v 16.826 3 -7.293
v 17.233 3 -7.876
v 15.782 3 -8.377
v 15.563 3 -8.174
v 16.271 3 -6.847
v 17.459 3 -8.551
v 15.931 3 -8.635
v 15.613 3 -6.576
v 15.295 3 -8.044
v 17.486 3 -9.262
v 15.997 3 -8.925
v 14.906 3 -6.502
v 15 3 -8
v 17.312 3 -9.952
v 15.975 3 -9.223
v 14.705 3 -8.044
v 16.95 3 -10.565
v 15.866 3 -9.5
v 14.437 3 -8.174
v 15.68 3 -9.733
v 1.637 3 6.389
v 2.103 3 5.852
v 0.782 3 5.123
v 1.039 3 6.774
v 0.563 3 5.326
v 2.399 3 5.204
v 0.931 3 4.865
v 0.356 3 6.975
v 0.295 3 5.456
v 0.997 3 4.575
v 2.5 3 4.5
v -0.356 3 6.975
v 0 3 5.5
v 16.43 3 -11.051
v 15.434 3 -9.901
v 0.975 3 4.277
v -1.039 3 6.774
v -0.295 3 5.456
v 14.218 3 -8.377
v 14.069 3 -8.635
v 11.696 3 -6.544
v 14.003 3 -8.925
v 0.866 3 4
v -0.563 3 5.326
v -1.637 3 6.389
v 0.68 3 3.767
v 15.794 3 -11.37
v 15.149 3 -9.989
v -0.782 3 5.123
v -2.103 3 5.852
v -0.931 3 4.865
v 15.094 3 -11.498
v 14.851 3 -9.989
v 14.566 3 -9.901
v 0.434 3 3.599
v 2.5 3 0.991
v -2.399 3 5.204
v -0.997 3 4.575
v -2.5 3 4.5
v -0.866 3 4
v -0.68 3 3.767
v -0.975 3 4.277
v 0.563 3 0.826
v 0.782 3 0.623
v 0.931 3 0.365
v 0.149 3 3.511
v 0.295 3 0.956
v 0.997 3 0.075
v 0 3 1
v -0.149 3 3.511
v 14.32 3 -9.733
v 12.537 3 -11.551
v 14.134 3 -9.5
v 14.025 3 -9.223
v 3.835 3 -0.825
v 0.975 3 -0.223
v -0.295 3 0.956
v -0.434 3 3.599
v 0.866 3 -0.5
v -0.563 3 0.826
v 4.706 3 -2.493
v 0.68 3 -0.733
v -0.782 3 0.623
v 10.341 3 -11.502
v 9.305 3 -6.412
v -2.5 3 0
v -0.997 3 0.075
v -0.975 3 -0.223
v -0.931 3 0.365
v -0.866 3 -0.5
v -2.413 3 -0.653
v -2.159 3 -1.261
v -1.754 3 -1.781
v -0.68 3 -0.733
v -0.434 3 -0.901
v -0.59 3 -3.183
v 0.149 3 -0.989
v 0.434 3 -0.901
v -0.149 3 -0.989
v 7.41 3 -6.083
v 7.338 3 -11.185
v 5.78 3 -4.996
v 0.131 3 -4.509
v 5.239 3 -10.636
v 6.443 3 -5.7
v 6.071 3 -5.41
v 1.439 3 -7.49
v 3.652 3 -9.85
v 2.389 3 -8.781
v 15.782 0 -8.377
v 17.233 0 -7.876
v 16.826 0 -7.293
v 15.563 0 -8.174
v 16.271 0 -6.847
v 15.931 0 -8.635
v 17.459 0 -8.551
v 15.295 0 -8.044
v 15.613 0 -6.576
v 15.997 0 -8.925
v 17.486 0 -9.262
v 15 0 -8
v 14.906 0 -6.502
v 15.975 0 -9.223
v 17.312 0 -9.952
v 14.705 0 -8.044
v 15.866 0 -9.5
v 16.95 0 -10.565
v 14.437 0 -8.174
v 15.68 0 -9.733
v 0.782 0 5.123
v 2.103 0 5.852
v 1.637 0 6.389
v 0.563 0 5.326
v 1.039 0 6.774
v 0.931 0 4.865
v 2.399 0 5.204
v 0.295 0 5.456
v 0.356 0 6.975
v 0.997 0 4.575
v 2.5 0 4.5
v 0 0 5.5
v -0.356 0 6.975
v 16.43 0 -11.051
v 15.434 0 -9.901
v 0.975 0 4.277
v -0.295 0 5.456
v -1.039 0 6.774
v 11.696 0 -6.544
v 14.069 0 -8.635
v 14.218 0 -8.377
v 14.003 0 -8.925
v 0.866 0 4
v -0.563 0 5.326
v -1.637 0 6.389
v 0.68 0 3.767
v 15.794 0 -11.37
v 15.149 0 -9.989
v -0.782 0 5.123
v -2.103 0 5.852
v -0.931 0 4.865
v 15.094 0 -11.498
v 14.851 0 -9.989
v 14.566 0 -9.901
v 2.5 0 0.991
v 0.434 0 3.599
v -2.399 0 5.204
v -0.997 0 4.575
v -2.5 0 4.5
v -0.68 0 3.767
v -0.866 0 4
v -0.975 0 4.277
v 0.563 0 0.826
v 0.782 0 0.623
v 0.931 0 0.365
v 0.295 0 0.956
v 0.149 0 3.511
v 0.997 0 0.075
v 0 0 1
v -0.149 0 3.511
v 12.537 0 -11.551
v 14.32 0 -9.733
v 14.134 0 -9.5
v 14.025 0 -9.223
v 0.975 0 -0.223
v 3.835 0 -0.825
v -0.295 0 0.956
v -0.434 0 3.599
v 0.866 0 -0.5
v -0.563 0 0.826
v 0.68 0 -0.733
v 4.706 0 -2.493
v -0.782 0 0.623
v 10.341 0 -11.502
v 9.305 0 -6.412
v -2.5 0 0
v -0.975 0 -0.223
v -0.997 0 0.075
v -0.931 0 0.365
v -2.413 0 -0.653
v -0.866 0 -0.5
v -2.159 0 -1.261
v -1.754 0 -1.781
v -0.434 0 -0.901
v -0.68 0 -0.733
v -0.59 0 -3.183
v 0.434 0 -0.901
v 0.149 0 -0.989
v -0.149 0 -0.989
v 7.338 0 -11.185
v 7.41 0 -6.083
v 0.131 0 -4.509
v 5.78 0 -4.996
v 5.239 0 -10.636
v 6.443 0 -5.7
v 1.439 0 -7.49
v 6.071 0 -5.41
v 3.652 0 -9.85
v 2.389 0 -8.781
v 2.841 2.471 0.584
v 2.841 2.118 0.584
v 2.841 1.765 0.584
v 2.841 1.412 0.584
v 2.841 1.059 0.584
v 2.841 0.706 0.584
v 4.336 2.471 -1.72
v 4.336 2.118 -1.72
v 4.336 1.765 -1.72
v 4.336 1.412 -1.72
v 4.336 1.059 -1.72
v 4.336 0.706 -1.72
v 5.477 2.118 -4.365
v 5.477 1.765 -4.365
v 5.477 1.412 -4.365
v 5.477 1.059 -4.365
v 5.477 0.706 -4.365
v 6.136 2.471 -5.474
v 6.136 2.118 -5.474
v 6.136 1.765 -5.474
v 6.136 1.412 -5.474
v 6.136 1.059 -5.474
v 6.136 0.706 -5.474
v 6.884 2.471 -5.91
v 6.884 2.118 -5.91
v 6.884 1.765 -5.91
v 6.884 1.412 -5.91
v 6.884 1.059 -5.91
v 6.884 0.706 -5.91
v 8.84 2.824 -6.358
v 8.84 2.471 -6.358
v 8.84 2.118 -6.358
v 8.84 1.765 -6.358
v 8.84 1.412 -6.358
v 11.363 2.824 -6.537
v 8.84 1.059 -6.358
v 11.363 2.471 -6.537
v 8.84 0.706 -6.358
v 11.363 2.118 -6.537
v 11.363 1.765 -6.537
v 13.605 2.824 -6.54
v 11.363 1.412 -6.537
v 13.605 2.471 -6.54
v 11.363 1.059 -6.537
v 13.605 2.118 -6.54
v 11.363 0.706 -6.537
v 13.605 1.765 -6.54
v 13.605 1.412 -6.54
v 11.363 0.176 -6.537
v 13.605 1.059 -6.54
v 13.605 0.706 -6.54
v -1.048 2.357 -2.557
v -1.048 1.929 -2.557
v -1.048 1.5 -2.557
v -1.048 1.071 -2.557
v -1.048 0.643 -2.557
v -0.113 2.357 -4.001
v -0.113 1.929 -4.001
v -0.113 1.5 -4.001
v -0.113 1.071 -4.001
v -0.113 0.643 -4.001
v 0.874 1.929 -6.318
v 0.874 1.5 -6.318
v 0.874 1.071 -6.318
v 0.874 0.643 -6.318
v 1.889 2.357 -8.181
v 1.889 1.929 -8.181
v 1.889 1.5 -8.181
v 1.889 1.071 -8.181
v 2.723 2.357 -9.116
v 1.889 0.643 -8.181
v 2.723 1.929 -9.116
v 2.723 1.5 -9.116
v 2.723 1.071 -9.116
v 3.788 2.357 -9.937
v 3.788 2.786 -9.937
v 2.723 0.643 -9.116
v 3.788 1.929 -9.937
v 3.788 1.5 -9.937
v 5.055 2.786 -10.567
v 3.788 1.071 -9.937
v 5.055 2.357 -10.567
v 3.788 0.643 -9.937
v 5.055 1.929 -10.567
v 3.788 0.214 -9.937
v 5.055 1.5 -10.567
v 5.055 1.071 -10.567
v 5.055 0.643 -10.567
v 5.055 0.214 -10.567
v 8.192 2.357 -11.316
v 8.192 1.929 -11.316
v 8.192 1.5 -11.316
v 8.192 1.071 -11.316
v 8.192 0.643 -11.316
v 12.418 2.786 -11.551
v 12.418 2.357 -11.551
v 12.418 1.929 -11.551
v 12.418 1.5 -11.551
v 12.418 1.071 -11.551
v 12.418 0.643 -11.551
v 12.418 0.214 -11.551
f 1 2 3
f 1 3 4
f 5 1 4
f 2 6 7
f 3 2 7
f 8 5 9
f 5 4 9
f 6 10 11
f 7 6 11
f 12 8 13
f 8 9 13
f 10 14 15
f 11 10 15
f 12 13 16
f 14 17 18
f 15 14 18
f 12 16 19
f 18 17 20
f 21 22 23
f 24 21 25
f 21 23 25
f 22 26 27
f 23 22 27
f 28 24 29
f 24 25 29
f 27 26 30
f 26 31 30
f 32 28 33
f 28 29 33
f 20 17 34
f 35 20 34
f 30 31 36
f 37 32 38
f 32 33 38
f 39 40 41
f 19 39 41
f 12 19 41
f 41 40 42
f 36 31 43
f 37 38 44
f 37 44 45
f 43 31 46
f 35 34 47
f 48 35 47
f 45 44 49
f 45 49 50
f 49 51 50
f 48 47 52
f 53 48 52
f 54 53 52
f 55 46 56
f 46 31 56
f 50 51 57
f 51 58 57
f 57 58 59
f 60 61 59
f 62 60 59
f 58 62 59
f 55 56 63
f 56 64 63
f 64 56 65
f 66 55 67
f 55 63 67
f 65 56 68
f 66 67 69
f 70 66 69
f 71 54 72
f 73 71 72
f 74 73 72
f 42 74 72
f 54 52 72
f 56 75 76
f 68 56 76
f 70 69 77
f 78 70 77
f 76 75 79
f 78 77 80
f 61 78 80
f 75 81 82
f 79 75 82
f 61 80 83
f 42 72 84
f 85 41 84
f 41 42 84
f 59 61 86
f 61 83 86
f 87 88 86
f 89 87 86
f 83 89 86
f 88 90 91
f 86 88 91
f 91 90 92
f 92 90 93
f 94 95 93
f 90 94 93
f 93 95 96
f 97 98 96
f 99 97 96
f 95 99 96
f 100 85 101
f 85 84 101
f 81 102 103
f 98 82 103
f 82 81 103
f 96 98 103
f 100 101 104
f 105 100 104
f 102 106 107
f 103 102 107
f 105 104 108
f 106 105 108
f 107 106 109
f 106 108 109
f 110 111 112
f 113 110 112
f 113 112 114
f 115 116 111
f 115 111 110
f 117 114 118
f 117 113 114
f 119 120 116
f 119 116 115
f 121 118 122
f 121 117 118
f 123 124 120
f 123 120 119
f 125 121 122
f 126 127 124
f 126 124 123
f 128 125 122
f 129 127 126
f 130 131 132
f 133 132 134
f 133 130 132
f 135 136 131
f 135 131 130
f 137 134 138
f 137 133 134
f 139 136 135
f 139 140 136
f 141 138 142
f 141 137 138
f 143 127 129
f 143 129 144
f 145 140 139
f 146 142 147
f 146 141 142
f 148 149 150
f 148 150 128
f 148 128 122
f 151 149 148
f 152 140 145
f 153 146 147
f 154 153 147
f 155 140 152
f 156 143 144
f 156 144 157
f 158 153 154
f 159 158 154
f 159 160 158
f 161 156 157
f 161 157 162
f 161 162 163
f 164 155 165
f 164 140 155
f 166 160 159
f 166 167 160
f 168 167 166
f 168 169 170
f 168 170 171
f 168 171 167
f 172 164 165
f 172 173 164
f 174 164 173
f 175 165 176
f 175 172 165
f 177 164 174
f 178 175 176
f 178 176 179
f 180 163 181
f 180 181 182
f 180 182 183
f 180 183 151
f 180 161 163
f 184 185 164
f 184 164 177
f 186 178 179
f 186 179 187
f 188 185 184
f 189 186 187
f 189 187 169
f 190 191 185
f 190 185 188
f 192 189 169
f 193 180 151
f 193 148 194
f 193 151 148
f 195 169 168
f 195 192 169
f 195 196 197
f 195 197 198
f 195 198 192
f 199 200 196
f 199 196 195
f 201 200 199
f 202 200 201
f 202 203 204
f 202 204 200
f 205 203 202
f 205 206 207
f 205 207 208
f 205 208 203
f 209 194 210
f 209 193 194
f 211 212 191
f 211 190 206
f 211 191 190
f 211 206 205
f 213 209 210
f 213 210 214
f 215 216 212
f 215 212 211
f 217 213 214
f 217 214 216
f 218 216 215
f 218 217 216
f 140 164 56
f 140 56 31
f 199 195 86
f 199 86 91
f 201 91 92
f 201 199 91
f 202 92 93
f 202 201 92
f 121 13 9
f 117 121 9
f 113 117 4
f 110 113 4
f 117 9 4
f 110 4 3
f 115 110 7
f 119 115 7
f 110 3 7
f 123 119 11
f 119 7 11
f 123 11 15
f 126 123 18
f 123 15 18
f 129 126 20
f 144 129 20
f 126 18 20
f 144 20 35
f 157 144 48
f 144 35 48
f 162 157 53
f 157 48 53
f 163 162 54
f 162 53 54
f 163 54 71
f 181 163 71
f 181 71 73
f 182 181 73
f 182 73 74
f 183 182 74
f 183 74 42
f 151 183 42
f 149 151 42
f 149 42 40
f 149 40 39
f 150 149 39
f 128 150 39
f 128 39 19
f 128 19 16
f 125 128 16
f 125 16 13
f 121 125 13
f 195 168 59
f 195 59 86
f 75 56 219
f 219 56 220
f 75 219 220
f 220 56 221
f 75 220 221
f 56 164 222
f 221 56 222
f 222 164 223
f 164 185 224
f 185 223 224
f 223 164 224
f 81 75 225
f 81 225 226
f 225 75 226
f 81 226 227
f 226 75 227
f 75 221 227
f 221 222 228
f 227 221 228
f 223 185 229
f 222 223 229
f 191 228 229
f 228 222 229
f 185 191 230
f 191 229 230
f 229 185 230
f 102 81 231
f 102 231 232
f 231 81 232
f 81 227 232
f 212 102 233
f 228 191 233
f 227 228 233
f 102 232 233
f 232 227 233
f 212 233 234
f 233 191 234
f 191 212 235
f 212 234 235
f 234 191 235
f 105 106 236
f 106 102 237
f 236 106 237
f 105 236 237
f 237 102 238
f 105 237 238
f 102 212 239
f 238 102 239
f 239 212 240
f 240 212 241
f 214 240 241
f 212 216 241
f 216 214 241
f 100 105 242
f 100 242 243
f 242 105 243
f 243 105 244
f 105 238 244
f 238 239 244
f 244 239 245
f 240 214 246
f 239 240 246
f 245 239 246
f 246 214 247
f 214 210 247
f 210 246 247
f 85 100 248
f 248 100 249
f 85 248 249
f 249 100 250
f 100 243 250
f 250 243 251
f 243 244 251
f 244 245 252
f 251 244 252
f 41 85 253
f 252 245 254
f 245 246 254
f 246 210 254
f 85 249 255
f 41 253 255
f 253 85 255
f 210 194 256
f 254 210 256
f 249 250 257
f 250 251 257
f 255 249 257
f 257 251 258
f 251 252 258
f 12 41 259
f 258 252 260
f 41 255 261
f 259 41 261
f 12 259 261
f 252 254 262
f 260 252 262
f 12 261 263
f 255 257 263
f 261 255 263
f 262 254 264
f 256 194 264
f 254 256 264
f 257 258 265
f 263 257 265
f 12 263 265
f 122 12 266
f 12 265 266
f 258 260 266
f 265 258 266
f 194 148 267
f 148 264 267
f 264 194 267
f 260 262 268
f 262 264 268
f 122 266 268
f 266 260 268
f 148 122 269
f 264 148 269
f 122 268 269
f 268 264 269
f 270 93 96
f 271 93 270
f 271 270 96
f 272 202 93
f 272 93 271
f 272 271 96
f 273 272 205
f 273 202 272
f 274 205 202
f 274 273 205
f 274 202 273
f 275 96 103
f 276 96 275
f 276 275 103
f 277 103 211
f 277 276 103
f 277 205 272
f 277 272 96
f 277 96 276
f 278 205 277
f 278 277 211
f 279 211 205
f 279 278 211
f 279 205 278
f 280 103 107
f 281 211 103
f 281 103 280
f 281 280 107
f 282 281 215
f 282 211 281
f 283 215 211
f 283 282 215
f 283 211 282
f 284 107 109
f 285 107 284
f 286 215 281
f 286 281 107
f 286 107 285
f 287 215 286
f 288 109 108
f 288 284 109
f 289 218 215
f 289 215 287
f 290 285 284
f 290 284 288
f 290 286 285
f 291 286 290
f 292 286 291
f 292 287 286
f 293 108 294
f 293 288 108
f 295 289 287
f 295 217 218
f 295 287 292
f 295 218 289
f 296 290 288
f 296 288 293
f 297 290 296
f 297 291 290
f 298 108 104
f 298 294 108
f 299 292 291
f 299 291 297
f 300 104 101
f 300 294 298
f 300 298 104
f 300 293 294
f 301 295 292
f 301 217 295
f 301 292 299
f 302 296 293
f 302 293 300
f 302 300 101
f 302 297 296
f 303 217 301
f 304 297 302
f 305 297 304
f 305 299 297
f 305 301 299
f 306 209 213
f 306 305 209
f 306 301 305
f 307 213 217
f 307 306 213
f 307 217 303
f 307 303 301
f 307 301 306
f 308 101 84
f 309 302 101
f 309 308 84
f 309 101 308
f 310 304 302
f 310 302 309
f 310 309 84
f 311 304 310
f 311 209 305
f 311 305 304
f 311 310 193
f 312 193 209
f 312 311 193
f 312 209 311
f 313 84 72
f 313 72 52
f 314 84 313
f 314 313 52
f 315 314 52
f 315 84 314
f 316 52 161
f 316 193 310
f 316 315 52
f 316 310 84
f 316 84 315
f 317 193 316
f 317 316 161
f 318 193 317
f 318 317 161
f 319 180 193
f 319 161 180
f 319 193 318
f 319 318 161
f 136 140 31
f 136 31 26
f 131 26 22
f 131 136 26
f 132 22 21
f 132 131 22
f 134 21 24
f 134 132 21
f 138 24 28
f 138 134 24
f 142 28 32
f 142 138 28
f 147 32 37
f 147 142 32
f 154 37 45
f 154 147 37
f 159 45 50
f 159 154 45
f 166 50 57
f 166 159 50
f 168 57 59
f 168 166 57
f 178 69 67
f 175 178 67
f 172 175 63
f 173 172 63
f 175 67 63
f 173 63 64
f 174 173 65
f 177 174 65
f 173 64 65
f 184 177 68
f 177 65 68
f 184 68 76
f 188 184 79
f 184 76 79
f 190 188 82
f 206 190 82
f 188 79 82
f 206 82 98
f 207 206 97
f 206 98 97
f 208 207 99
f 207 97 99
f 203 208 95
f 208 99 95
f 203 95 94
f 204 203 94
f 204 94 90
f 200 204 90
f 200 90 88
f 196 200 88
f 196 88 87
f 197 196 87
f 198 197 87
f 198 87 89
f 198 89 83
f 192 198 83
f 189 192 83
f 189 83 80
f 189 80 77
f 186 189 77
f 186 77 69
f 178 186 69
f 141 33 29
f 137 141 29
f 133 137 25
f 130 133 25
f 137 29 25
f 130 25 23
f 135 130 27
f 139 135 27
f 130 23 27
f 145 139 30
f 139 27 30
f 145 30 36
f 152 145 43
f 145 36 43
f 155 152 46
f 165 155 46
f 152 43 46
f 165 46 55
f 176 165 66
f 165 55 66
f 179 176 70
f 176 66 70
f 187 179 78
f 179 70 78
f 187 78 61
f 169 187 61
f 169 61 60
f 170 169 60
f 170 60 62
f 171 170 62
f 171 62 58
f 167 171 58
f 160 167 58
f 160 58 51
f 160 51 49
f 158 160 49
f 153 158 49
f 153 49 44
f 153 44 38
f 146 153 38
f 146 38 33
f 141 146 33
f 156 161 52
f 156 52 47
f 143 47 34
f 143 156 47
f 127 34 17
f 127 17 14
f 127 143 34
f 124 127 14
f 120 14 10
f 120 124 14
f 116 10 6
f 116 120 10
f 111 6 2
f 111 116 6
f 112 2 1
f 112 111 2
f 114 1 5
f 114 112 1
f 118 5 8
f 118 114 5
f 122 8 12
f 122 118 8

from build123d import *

# Parameters (mm, degrees)
BOSS_EXTRUDE1_DEPTH = 3
SKETCH2_R           = 1
CUT_EXTRUDE1_DEPTH  = 22.181959729


with BuildPart() as part:
    # Sketch1 → Boss-Extrude1 (new body)
    with BuildSketch(Plane(origin=(0, 0, 0), x_dir=(1, 0, 0), z_dir=(0, 1, 0))):
        with BuildLine():
            Line((2.5, 0), (2.5, -4.5))
            ThreePointArc((2.5, -4.5), (0, -7), (-2.5, -4.5))
            Line((-2.5, -4.5), (-2.5, 0))
            ThreePointArc((-2.5, 0), (0, 2.5), (2.5, 0))
        make_face()
        with BuildLine():
            ThreePointArc((1.75437082, -1.781062331), (-1.781062331, -1.75437082), (-1.75437082, 1.781062331))
            add(Edge.make_bspline(
                [(-1.75437082, 1.781062331), (-1.624344078, 1.909140455), (-1.363618783, 2.180920031), (-0.934031434, 2.684894066), (-0.500467654, 3.293174505), (-0.101558497, 3.999057838), (0.34080487, 4.957895832), (0.821917137, 6.255571477), (1.714343148, 8.188128347), (3.655881762, 10.080915103), (5.933377524, 10.940861788), (8.146541971, 11.336521676), (10.080084472, 11.509987641), (11.978583924, 11.559465158), (13.677207867, 11.543719259), (14.630887101, 11.515746346), (15.094478117, 11.498214139)],
                knots=[0, 0, 0, 0, 0.03125, 0.0625, 0.125, 0.1875, 0.25, 0.375, 0.5, 0.625, 0.75, 0.8125, 0.875, 0.9375, 0.96875, 1, 1, 1, 1], degree=3))
            ThreePointArc((15.094478117, 11.498214139), (17.498214139, 8.905521883), (14.905521883, 6.501785861))
            add(Edge.make_bspline(
                [(1.75437082, -1.781062331), (1.951496972, -1.586890368), (2.342143686, -1.179754933), (3.020330121, -0.385545775), (3.725845298, 0.603727778), (4.363656227, 1.735460048), (4.994886909, 3.116947346), (5.504379808, 4.503589215), (5.878706331, 5.199246763), (6.125781999, 5.475918673), (6.372815317, 5.672288553), (6.830218188, 5.908335694), (7.611720621, 6.156671842), (8.771844258, 6.369671634), (10.080276197, 6.489545456), (11.343932269, 6.540793236), (12.408742942, 6.555070021), (13.575038588, 6.544467964), (14.472115696, 6.51817653), (14.905521883, 6.501785861)],
                knots=[0, 0, 0, 0, 0.03125, 0.0625, 0.125, 0.1875, 0.25, 0.375, 0.5, 0.5625, 0.625, 0.6875, 0.75, 0.8125, 0.875, 0.90625, 0.9375, 0.96875, 1, 1, 1, 1], degree=3))
        make_face()
    extrude(amount=BOSS_EXTRUDE1_DEPTH)

    # Sketch2 → Cut-Extrude1 (cut, through all)
    with BuildSketch(Plane(origin=(0, 3, 0), x_dir=(1, 0, 0), z_dir=(0, 1, 0))):
        with Locations(Location((0, 0, 0), (0, 0, 270))):
            Circle(SKETCH2_R)
        with Locations(Location((0, -4.5, 0), (0, 0, 270))):
            Circle(SKETCH2_R)
        with Locations(Location((15, 9, 0), (0, 0, 270))):
            Circle(SKETCH2_R)
    extrude(amount=-CUT_EXTRUDE1_DEPTH, mode=Mode.SUBTRACT)


solid = part.part
